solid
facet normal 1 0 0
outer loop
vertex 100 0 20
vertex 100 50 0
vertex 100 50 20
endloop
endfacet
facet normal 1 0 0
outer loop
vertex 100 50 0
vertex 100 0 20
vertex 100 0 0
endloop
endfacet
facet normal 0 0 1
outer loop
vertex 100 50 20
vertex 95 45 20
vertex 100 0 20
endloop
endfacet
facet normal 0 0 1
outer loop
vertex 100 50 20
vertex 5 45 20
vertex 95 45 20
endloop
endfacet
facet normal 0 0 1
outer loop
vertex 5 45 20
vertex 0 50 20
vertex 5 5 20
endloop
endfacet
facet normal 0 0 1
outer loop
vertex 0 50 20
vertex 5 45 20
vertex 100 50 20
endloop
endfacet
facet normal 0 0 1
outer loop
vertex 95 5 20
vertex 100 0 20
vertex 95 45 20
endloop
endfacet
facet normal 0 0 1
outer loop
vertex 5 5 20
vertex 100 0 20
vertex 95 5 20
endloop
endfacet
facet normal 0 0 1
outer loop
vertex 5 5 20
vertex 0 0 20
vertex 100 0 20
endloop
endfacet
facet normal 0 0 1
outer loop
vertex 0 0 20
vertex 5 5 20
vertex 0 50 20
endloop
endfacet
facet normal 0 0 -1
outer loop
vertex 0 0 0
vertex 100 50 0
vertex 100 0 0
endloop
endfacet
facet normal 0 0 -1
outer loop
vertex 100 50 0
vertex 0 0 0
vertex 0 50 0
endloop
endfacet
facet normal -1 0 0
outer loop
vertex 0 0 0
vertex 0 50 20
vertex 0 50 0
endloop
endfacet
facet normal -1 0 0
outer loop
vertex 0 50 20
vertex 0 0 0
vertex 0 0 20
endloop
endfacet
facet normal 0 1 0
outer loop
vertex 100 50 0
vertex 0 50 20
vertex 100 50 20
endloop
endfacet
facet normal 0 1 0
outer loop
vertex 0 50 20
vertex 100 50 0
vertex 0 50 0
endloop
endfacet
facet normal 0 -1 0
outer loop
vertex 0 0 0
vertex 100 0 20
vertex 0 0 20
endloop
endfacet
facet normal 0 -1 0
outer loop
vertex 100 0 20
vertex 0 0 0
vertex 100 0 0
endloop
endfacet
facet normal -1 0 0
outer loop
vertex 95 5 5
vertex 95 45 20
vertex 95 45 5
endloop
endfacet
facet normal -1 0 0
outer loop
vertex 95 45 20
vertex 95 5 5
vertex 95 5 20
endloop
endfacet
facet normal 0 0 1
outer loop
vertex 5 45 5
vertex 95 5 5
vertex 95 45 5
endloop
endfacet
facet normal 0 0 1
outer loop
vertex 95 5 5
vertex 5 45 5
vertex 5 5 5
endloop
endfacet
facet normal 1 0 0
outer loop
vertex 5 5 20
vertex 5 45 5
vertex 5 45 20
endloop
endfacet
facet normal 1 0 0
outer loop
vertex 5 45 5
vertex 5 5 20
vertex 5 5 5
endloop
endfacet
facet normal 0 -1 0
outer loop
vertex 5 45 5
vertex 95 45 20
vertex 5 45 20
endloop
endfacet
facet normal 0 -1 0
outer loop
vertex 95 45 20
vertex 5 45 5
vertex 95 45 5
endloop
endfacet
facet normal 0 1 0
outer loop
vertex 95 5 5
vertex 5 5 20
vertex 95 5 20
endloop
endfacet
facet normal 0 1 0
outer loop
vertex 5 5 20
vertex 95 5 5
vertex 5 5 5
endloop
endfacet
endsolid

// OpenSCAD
$fn = 100;

union() {
	difference() {
		cube(size = [100, 50, 20]);
		translate(v = [5, 5, 5]) {
			cube(size = [90, 40, 20]);
		}
		translate(v = [3, 3, 23]) {
			mirror(v = [0, 0, 1]) {
				union() {
					cylinder(h = 2, r1 = 2.5);
					cylinder(h = 1, r1 = 10);
				}
			}
		}
		translate(v = [3, 47, 23]) {
			mirror(v = [0, 0, 1]) {
				union() {
					cylinder(h = 2, r1 = 2.5);
					cylinder(h = 1, r1 = 10);
				}
			}
		}
		translate(v = [97, 3, 23]) {
			mirror(v = [0, 0, 1]) {
				union() {
					cylinder(h = 2, r1 = 2.5);
					cylinder(h = 1, r1 = 10);
				}
			}
		}
		translate(v = [97, 47, 23]) {
			mirror(v = [0, 0, 1]) {
				union() {
					cylinder(h = 2, r1 = 2.5);
					cylinder(h = 1, r1 = 10);
				}
			}
		}
	}
	%translate(v = [0, 0, 20]) {
		difference() {
			union() {
				translate(v = [0, 0, 0]) {
					cube(size = [100, 50, 5]);
				}
				translate(v = [5, 5, 5]) {
					linear_extrude(height = 1) {
						text(text = "box");
					}
				}
			}
			translate(v = [3, 3, 0.5]) {
				mirror(v = [0, 0, 1]) {
					union() {
						cylinder(h = 2, r1 = 2.5);
						cylinder(h = 1, r1 = 10);
					}
				}
			}
			translate(v = [3, 47, 0.5]) {
				mirror(v = [0, 0, 1]) {
					union() {
						cylinder(h = 2, r1 = 2.5);
						cylinder(h = 1, r1 = 10);
					}
				}
			}
			translate(v = [97, 3, 0.5]) {
				mirror(v = [0, 0, 1]) {
					union() {
						cylinder(h = 2, r1 = 2.5);
						cylinder(h = 1, r1 = 10);
					}
				}
			}
			translate(v = [97, 47, 0.5]) {
				mirror(v = [0, 0, 1]) {
					union() {
						cylinder(h = 2, r1 = 2.5);
						cylinder(h = 1, r1 = 10);
					}
				}
			}
		}
	}
}
